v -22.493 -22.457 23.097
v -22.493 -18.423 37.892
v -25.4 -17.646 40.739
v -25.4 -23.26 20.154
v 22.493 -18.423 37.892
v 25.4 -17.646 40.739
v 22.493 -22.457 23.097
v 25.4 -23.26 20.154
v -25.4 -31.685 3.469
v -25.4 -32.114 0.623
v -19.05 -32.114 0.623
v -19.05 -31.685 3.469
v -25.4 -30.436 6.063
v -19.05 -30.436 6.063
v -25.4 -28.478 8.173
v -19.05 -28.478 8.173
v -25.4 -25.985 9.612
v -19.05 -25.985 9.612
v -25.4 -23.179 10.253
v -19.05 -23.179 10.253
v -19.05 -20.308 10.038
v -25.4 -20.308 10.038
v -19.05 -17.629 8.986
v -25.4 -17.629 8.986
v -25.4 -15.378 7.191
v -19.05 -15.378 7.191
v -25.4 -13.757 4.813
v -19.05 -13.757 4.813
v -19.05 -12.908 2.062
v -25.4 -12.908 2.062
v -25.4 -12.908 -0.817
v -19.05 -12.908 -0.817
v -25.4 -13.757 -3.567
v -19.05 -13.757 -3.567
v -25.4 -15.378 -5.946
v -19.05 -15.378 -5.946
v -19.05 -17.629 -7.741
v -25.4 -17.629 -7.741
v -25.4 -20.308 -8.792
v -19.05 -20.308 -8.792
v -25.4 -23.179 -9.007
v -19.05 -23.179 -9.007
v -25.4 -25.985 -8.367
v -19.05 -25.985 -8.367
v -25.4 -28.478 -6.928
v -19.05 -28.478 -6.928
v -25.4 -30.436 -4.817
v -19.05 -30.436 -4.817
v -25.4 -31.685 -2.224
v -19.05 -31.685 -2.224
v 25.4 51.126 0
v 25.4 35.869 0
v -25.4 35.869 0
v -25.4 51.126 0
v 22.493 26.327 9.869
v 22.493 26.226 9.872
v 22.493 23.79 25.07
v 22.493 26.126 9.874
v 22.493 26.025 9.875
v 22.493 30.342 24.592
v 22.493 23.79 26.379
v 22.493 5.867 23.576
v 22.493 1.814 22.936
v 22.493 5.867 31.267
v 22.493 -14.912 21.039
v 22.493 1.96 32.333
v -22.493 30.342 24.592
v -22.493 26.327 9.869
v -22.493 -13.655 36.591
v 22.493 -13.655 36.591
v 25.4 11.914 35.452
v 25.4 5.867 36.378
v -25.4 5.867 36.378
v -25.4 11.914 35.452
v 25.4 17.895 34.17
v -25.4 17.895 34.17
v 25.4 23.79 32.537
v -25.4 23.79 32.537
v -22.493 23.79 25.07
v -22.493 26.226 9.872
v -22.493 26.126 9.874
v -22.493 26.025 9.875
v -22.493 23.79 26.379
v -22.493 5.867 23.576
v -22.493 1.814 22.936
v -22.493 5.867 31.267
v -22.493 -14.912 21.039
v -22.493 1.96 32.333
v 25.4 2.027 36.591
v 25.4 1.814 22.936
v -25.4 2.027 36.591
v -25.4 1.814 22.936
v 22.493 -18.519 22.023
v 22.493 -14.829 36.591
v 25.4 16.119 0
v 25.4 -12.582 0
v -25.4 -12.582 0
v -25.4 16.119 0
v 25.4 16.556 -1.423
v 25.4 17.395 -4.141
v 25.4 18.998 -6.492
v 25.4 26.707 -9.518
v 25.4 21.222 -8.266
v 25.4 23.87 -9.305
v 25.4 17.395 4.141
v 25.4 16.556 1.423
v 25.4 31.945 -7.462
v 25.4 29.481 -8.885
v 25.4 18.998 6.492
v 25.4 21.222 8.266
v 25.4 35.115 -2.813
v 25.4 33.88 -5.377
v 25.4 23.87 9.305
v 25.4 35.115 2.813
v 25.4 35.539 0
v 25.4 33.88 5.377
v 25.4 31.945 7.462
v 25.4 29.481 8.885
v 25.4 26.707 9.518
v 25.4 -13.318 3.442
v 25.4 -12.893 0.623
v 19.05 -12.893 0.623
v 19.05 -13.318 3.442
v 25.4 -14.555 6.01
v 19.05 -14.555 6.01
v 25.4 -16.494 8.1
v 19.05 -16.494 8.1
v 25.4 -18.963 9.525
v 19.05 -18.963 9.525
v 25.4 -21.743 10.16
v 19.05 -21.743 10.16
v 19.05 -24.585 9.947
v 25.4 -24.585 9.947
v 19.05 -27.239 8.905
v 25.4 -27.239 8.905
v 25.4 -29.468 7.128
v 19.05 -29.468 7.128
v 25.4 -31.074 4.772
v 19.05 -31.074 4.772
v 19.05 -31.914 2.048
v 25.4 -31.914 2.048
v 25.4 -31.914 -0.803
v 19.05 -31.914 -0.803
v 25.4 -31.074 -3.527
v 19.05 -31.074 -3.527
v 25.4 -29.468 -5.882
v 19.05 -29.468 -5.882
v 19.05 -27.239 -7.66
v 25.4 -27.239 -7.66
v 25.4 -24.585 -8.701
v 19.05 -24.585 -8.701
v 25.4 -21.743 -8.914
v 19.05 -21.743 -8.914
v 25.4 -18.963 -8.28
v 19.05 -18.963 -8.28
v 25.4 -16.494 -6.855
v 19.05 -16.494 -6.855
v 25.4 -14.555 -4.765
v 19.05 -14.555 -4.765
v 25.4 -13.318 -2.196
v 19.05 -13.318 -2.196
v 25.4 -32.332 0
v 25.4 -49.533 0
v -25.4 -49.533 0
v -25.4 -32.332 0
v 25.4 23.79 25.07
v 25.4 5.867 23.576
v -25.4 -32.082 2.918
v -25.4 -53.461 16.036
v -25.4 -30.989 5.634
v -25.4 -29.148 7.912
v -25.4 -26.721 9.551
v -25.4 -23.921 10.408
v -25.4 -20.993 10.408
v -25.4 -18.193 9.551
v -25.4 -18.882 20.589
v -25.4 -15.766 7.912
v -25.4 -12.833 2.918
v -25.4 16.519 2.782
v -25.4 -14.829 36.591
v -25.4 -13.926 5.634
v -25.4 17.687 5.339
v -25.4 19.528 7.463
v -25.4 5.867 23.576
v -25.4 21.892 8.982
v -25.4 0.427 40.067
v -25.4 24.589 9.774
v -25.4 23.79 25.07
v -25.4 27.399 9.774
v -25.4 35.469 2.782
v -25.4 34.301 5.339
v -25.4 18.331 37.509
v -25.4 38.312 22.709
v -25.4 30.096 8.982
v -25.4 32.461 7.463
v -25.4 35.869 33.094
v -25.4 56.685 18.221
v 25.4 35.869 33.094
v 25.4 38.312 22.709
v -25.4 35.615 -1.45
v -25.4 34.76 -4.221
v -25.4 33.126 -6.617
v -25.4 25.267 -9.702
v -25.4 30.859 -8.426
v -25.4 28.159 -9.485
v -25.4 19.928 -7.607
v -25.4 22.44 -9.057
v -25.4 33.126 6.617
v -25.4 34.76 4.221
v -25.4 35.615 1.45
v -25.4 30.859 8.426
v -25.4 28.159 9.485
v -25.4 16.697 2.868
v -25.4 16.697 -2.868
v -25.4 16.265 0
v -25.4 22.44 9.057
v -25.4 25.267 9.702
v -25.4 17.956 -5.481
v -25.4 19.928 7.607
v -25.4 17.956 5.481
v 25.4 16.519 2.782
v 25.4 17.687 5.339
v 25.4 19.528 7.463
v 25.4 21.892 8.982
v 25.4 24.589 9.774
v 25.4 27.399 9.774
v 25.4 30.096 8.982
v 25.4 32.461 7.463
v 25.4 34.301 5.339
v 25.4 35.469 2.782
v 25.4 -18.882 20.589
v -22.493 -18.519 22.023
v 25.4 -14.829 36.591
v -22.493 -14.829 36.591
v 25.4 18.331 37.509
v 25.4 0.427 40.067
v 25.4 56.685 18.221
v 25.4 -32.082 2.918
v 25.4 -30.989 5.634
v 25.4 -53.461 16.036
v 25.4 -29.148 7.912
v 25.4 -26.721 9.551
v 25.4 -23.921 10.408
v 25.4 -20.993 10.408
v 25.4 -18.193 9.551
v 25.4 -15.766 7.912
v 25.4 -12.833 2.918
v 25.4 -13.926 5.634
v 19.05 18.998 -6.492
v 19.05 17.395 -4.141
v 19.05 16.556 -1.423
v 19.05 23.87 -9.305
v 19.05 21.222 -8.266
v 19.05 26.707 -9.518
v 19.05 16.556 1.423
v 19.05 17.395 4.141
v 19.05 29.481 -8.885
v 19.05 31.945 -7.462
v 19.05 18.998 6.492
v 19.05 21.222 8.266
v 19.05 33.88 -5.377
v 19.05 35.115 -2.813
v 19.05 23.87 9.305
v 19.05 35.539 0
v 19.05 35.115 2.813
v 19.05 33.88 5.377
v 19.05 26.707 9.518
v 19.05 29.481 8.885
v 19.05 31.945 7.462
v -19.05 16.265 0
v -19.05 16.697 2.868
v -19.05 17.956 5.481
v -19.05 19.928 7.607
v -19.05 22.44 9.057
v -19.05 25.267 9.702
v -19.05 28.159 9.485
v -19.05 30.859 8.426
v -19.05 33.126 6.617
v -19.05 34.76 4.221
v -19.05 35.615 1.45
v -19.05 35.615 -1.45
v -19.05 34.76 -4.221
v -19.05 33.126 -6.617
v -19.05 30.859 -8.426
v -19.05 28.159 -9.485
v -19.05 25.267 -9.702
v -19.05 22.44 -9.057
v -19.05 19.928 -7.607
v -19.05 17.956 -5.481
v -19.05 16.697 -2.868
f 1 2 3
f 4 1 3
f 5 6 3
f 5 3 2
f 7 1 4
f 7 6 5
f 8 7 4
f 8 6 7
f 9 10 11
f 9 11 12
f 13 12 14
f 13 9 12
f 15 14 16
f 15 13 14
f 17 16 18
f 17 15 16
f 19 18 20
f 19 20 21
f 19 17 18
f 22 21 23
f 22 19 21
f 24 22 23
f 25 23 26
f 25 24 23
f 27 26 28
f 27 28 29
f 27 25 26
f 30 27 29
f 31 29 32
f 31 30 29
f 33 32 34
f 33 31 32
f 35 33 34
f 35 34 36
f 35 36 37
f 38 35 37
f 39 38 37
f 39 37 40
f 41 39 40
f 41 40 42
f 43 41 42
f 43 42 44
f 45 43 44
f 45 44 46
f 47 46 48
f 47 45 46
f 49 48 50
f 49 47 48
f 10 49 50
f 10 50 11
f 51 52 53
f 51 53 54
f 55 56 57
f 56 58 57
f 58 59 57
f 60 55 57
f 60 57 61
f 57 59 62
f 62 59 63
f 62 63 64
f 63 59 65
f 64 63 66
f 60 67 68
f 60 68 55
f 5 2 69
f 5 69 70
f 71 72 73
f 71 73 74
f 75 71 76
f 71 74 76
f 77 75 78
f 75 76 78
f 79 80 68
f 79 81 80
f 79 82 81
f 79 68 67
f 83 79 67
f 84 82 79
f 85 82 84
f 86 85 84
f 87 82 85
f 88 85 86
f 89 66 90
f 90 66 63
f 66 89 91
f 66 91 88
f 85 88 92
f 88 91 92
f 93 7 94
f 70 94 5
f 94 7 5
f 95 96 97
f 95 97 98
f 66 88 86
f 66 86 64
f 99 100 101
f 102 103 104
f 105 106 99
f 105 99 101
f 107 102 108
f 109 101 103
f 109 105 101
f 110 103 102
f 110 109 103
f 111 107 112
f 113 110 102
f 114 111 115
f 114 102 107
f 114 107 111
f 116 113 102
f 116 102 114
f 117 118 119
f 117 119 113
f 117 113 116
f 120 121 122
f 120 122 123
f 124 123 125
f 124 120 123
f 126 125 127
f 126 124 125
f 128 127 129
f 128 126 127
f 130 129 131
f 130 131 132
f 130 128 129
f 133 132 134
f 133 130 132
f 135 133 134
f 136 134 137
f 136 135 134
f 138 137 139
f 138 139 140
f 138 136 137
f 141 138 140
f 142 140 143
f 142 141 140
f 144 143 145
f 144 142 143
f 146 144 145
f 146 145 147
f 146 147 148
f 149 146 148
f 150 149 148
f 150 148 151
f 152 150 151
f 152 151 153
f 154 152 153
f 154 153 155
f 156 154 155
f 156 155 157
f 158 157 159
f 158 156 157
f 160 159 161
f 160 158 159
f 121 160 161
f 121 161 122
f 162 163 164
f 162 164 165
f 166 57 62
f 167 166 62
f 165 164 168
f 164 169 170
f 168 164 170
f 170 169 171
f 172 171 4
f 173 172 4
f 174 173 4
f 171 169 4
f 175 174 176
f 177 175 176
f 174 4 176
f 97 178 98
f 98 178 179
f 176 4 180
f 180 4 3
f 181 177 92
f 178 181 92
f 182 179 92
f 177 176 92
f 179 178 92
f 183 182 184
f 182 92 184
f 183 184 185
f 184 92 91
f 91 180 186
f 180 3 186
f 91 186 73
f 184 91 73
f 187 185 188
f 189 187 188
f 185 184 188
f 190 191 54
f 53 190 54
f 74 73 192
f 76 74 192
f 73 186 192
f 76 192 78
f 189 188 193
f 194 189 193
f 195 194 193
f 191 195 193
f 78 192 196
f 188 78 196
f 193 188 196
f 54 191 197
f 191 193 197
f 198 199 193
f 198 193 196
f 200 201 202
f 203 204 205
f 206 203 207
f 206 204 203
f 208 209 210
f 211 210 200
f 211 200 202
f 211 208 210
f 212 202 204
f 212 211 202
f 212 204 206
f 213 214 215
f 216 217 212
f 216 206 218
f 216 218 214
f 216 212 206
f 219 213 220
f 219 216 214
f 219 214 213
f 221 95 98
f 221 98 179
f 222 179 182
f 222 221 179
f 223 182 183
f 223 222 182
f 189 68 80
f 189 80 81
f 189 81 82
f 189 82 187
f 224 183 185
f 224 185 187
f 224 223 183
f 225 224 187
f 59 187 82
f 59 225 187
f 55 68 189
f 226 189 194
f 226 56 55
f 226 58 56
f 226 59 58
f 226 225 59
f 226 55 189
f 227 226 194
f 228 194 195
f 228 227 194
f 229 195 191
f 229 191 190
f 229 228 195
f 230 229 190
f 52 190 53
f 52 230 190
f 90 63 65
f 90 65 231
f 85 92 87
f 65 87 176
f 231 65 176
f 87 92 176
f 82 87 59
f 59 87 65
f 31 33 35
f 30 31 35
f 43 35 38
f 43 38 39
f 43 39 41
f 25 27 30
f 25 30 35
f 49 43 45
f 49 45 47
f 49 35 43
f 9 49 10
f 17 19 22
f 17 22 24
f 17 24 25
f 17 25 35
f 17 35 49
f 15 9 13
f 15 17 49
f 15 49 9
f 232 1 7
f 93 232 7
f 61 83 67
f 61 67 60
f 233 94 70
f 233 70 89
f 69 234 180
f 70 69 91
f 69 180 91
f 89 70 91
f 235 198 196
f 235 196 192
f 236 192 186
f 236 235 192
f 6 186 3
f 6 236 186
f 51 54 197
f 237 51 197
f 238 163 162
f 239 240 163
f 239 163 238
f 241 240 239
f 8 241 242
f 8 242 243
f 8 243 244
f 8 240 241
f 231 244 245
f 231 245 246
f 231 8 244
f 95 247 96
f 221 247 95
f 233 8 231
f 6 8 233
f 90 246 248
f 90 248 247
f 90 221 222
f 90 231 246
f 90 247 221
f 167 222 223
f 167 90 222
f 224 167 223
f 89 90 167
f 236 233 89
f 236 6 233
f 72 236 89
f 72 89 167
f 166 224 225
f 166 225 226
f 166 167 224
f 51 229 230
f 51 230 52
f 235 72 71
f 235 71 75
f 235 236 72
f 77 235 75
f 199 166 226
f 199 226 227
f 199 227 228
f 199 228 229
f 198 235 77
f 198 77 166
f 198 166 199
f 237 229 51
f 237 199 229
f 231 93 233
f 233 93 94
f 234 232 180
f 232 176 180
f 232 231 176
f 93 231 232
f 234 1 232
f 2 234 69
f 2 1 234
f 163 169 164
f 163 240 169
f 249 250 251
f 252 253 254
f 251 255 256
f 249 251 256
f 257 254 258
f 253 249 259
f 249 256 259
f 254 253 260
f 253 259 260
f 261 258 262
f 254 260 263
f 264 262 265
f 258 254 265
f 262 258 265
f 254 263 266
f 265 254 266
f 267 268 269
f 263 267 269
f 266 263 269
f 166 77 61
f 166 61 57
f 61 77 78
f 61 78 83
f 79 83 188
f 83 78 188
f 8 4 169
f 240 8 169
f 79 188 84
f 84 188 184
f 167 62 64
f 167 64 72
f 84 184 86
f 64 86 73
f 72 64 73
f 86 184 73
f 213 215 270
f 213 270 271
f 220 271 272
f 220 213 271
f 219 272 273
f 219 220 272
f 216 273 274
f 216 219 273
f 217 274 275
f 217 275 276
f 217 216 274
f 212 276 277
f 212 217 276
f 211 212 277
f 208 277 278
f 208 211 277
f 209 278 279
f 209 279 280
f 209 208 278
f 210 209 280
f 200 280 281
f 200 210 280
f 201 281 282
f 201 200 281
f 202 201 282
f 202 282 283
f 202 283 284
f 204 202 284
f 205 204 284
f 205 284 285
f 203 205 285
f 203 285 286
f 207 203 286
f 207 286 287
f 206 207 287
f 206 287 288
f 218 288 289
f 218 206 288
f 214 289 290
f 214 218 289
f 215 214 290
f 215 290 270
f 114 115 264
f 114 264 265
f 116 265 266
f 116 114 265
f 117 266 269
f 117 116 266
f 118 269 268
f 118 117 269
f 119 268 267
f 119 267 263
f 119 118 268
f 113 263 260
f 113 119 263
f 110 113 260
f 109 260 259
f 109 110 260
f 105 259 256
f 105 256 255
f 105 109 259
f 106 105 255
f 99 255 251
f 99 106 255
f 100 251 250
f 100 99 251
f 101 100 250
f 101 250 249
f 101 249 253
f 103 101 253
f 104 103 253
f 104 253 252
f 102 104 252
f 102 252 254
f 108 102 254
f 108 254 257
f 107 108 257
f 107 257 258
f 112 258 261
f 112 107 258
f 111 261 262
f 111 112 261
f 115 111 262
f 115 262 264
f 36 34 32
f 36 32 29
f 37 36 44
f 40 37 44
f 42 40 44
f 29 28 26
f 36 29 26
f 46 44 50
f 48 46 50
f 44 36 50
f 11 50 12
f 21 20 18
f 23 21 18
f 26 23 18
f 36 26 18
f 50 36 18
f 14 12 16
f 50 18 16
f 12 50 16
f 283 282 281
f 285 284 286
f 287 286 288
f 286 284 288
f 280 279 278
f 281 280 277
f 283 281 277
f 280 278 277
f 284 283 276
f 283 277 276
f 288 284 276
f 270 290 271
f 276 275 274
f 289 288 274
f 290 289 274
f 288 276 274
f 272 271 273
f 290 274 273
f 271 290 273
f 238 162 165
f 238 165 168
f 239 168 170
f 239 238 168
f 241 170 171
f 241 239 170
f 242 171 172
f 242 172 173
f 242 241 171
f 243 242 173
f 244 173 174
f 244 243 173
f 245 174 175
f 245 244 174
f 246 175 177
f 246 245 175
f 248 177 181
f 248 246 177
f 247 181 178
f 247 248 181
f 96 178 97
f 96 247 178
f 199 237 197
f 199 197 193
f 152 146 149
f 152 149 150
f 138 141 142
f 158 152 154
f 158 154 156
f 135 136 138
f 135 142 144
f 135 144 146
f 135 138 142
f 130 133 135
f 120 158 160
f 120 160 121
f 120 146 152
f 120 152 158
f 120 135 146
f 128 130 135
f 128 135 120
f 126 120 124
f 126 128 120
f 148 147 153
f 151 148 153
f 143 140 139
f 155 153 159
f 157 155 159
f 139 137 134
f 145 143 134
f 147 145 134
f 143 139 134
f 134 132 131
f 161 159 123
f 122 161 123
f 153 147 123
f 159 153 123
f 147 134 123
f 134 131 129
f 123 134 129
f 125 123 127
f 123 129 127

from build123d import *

# Parameters (mm, degrees)
F1_DEPTH = 25.4
F2_R     = 9.563737
F2_R_2   = 9.544424
F3_DEPTH = 6.35
F4_R     = 9.729083
F4_R_2   = 9.657045
F5_DEPTH = 6.35
F6_W     = 44.986753
F6_H     = 15.334638
F7_DEPTH = 50.546
F9_DEPTH = 59.69


with BuildPart() as f1:
    # F0 (on Right) → F1 (new body, symmetric)
    with BuildSketch(Plane.YZ):
        with BuildLine():
            Line((-53.460501, 16.036119), (-49.53329, 0))
            Line((-49.53329, 0), (-32.332018, 0))
            ThreePointArc((-32.332018, 0), (-22.457214, 10.517017), (-12.582411, 0))
            Line((-12.582411, 0), (16.119331, 0))
            ThreePointArc((16.119331, 0), (25.994134, 9.874803), (35.868938, 0))
            Line((35.868938, 0), (51.125996, 0))
            Line((51.125996, 0), (56.684917, 18.220892))
            Line((56.684917, 18.220892), (38.312331, 22.709147))
            Line((38.312331, 22.709147), (35.868938, 33.093561))
            ThreePointArc((35.868938, 33.093561), (9.412354, 39.022704), (-17.646126, 40.73857))
            Line((-17.646126, 40.73857), (-23.259997, 20.154368))
            Line((-23.259997, 20.154368), (-53.460501, 16.036119))
        make_face()
    extrude(amount=F1_DEPTH, both=True)

    # F6 (on face) → F7 (cut)
    with BuildSketch(Plane(origin=(0, -26.765798, 7.299761), x_dir=(1, 0, 0), z_dir=(0, -0.964764, 0.263117))):
        with Locations((-2e-06, 24.041756)):
            Rectangle(F6_W, F6_H)
    extrude(amount=-F7_DEPTH, mode=Mode.SUBTRACT)

    # F8 (on face) → F9 (cut)
    with BuildSketch(Plane(origin=(-25.4, 0, 0), x_dir=(0, -1, 0), z_dir=(-1, 0, 0))):
        Polygon((-2.02692, 36.591243), (-1.813561, 22.936201), (18.882358, 20.58924), (14.82852, 36.591243), align=None)
        with BuildLine():
            Line((-23.789641, 25.069801), (-5.8674, 23.57628))
            Line((-5.8674, 23.57628), (-5.8674, 36.377881))
            ThreePointArc((-5.8674, 36.377881), (-14.913724, 34.855258), (-23.789641, 32.537401))
            Line((-23.789641, 32.537401), (-23.789641, 25.069801))
        make_face()
    extrude(amount=-F9_DEPTH, mode=Mode.SUBTRACT)


with BuildPart() as f3:
    # F2 (on face) → F3 (new body)
    with BuildSketch(Plane.YZ.offset(25.4)):
        with Locations((-22.457214, 0.622605)):
            Circle(F2_R)
        with Locations((25.994134, 0)):
            Circle(F2_R_2)
    extrude(amount=-F3_DEPTH)


with BuildPart() as f5:
    # F4 (on face) → F5 (new body)
    with BuildSketch(Plane(origin=(-25.4, 0, 0), x_dir=(0, -1, 0), z_dir=(-1, 0, 0))):
        with Locations((-25.994134, 0)):
            Circle(F4_R)
        with Locations((22.457214, 0.622605)):
            Circle(F4_R_2)
    extrude(amount=-F5_DEPTH)


solid = Compound([f1.part, f3.part, f5.part])
